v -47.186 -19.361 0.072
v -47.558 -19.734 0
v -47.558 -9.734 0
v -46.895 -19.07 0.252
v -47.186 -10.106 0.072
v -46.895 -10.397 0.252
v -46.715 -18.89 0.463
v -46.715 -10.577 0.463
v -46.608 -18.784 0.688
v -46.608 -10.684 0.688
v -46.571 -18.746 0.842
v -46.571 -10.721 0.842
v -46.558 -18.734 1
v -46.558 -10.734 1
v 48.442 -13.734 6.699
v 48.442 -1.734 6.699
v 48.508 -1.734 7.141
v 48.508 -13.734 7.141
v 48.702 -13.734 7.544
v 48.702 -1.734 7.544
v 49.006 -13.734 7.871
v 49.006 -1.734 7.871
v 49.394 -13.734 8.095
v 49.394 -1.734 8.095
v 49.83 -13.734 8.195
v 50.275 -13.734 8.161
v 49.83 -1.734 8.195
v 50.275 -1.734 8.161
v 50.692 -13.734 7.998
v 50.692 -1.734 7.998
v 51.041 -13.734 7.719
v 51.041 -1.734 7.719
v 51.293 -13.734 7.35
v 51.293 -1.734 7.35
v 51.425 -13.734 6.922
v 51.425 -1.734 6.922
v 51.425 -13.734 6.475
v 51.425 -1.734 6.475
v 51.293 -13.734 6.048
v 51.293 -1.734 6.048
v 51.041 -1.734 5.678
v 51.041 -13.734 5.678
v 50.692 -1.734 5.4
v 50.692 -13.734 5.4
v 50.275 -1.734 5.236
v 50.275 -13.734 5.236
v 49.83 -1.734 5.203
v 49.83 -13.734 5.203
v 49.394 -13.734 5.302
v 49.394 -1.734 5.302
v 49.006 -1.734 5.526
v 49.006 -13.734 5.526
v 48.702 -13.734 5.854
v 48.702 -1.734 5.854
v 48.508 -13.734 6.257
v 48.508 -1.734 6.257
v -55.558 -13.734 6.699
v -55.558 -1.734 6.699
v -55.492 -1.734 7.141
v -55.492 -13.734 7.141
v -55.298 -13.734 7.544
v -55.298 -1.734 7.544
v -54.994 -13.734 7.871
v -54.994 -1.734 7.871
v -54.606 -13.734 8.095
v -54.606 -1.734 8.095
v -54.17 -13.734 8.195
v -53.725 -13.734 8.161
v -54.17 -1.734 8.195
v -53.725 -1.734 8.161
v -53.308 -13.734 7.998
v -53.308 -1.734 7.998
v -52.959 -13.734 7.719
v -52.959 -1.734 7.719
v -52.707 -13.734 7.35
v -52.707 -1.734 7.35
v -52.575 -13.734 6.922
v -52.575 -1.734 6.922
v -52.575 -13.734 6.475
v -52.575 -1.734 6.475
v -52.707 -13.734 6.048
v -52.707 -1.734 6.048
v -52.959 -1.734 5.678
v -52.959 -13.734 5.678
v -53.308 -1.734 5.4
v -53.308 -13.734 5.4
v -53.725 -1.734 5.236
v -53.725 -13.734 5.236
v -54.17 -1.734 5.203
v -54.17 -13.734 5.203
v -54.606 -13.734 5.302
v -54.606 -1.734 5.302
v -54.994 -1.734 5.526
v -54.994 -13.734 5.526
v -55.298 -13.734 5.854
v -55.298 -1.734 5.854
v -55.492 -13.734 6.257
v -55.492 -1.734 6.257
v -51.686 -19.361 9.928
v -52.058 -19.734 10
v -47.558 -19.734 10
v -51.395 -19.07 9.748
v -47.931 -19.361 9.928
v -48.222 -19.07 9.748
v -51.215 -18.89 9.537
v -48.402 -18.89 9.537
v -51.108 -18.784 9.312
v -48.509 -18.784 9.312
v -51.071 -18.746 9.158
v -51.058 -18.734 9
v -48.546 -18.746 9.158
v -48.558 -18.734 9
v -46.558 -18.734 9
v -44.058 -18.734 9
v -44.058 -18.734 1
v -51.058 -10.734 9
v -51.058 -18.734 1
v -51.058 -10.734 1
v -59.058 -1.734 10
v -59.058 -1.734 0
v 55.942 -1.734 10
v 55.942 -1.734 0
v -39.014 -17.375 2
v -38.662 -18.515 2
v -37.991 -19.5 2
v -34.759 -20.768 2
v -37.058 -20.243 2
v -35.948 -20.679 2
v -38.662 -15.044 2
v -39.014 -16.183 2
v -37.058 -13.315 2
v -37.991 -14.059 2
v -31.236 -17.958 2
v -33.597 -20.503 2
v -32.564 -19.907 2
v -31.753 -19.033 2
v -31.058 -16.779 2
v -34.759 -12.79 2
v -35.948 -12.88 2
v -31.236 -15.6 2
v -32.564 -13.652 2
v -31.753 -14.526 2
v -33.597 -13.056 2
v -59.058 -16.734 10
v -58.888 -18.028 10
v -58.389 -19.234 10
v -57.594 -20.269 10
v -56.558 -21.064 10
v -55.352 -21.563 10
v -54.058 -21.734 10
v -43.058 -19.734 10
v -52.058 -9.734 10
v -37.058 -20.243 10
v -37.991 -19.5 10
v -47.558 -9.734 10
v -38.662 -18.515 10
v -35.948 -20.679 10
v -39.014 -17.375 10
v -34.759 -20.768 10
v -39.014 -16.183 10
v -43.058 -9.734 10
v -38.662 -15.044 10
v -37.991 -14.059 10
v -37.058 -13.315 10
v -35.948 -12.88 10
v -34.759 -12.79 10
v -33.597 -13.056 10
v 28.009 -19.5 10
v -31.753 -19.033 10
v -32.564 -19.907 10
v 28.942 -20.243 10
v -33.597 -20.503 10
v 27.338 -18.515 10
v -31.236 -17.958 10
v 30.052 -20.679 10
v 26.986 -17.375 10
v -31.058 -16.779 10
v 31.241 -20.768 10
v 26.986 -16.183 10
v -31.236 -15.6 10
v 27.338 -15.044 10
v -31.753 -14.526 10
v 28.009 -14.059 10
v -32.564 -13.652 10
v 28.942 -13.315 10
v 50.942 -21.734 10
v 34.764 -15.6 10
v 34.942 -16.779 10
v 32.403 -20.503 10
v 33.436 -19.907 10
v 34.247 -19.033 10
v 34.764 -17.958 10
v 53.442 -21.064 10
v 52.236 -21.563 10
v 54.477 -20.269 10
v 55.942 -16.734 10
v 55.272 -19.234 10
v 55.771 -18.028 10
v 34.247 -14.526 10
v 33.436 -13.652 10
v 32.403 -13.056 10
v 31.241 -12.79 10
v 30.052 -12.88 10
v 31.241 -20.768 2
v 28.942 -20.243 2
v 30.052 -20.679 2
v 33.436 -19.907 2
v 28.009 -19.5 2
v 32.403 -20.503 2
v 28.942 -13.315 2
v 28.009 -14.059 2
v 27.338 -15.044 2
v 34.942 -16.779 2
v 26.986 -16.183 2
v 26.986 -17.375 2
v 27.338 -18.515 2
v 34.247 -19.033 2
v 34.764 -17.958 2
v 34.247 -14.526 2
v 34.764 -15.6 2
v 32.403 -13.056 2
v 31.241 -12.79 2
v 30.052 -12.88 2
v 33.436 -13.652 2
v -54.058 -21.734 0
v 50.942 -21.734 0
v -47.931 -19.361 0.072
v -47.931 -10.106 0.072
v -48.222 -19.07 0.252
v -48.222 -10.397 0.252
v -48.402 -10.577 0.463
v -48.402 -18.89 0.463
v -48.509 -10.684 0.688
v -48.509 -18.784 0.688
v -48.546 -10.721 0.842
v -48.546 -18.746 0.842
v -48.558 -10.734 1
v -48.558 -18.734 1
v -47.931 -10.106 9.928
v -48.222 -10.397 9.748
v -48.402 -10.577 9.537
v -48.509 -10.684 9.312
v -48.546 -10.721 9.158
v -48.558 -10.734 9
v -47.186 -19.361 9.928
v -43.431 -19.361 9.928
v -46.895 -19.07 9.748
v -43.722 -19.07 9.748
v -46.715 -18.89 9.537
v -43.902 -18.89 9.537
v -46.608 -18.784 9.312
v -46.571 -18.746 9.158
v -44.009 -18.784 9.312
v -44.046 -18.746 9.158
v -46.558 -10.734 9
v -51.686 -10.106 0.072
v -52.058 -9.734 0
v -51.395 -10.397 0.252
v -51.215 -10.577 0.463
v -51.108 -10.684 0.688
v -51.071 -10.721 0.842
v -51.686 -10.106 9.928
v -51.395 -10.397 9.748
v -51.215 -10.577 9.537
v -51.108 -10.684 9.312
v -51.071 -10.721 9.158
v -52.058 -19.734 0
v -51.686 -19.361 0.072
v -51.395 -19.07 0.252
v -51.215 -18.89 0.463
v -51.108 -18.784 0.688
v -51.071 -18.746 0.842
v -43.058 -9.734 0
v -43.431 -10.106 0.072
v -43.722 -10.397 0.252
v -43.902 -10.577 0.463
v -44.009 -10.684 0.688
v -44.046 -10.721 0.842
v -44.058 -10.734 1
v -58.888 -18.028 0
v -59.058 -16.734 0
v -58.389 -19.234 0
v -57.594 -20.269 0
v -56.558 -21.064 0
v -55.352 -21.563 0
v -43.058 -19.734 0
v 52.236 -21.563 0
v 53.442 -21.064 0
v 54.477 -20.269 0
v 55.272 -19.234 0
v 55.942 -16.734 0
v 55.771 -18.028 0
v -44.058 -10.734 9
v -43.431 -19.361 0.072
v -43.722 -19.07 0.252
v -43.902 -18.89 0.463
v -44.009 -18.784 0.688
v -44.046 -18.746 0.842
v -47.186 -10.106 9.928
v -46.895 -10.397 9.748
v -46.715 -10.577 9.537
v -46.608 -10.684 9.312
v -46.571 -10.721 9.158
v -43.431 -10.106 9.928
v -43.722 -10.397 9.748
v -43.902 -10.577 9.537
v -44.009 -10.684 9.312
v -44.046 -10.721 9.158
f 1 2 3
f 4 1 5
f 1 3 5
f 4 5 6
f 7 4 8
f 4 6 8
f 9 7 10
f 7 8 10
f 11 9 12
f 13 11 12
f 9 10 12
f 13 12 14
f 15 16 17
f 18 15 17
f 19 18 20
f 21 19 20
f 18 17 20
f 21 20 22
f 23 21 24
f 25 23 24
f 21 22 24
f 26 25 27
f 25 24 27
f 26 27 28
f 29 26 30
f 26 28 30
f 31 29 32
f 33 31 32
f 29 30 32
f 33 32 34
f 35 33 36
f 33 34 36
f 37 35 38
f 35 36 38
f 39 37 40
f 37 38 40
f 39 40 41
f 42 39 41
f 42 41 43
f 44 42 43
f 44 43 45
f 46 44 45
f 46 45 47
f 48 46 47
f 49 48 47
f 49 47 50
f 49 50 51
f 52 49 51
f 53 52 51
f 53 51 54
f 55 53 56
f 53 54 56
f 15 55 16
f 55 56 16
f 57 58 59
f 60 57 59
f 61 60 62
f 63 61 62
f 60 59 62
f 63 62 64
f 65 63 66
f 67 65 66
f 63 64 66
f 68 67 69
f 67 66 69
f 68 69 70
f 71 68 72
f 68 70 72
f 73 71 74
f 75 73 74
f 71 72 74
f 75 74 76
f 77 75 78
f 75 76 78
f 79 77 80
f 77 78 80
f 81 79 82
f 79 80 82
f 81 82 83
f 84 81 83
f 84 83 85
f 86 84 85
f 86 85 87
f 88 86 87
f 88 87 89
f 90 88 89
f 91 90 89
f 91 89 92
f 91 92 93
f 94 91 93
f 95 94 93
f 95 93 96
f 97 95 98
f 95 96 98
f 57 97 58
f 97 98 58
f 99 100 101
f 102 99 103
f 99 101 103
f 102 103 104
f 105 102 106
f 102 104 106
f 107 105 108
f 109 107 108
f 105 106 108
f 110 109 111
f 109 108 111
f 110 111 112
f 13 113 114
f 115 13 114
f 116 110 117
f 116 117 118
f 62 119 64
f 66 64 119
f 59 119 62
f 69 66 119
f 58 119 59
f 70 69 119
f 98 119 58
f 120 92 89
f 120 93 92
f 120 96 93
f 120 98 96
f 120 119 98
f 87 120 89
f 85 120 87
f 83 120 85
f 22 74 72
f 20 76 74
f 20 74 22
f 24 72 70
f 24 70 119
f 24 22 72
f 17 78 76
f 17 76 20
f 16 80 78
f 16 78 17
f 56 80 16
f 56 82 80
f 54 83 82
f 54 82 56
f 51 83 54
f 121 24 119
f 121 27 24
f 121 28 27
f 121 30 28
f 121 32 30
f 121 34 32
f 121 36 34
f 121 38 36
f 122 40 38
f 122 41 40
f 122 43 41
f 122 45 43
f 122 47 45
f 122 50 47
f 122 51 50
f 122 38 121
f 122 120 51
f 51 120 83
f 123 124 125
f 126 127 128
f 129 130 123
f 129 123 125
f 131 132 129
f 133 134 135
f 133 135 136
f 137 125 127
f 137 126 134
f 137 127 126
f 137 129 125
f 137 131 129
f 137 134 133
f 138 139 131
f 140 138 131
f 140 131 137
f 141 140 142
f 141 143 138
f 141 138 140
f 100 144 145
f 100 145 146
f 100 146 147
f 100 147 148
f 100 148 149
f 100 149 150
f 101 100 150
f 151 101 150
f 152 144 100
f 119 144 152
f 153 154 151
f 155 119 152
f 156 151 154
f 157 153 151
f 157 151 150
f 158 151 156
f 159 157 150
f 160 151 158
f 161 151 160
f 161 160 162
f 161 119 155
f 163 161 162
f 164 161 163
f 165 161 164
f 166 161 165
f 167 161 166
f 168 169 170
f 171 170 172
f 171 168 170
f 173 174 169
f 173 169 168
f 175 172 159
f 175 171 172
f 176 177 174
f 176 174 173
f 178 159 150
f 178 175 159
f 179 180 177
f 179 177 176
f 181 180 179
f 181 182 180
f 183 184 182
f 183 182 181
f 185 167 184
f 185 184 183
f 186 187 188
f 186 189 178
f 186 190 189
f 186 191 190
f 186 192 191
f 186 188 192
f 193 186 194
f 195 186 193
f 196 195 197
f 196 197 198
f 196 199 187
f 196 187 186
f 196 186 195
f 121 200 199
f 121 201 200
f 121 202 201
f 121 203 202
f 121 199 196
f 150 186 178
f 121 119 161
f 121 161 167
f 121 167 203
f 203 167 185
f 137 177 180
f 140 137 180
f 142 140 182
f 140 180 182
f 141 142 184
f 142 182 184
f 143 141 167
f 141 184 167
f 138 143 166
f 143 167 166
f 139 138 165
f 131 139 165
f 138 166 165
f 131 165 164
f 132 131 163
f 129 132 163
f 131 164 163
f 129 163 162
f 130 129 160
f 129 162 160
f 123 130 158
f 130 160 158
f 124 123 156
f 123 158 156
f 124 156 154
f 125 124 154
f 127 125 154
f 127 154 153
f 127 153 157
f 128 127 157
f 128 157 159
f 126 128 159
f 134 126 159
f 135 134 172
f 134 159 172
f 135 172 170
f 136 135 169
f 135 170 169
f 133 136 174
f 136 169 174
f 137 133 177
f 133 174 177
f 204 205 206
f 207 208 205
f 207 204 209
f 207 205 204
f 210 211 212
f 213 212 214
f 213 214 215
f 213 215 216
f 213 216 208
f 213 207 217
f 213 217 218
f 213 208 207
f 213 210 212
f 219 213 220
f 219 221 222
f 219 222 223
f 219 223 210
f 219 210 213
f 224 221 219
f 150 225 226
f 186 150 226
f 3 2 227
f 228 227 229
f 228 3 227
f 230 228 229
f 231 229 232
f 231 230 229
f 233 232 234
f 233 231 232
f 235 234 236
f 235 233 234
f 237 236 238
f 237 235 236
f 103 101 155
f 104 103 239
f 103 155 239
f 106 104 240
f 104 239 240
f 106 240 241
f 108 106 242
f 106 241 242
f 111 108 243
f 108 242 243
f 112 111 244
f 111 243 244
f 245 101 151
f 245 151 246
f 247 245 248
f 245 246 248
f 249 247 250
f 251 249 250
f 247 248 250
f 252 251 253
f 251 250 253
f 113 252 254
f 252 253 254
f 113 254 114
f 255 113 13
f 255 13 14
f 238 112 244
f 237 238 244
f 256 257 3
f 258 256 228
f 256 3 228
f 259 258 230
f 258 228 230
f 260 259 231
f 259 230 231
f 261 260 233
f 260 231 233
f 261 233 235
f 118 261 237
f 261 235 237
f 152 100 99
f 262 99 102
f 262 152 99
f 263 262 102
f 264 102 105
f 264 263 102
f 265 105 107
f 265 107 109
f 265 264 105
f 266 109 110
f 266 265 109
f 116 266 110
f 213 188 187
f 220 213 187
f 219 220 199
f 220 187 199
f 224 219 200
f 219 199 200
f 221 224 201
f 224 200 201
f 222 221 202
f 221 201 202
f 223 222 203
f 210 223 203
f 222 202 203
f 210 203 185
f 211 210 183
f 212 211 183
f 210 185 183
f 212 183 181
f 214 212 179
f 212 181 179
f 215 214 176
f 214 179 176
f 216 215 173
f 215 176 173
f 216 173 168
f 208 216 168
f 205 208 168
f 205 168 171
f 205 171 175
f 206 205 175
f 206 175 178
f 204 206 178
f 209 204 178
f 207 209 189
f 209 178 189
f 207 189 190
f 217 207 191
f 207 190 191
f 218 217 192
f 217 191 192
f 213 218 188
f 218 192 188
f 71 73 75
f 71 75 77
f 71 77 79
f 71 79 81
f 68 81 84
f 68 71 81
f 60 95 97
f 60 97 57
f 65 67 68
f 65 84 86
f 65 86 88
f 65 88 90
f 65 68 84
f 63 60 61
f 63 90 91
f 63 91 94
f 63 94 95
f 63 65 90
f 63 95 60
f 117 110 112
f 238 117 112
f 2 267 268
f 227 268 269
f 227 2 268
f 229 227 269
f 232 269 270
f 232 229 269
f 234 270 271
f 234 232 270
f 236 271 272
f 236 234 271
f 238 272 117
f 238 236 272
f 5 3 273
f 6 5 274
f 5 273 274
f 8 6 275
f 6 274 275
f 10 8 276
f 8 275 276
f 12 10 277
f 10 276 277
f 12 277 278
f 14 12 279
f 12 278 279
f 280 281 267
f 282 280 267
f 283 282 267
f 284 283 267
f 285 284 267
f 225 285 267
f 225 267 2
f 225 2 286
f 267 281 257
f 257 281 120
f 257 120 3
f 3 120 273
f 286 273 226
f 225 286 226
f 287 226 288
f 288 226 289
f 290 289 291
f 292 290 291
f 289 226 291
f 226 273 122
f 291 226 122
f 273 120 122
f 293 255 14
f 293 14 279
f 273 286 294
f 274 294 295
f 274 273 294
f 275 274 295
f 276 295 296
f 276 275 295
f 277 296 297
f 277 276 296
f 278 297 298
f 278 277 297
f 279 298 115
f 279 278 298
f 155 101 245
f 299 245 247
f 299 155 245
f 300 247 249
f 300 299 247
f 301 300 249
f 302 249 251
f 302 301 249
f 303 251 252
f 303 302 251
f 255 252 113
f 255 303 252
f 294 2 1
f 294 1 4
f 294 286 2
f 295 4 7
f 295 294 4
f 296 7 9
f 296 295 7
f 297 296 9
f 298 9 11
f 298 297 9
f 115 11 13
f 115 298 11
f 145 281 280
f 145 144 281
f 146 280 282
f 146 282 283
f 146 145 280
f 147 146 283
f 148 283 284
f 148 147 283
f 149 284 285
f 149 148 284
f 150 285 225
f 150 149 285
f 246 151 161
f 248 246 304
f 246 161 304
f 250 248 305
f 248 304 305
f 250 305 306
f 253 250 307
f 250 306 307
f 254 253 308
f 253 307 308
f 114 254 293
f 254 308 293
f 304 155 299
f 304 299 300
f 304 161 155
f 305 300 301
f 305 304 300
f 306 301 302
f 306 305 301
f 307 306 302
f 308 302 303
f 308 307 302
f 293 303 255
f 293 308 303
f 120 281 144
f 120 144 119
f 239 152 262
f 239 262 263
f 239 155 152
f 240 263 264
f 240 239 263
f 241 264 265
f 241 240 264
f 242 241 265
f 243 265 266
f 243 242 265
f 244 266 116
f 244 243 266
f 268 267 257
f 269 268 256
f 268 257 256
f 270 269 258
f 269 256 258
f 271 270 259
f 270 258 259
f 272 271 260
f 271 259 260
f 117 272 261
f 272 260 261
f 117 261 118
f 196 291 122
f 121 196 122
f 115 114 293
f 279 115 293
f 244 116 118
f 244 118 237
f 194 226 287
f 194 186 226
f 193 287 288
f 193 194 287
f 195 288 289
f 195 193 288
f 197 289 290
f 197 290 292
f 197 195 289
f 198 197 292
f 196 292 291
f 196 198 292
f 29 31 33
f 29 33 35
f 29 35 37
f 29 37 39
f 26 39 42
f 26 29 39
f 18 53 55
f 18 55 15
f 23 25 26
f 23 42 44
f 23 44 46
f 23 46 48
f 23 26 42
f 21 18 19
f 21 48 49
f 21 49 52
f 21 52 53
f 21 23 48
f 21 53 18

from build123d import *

# Parameters (mm, degrees)
F0_W     = 115
F0_H     = 20
F1_DEPTH = 10
F2_R     = 4
F3_DEPTH = 8
F4_R     = 1.5
F5_DEPTH = 12
F6_R     = 5
F7_W     = 2.5
F7_H     = 8
F8_DEPTH = 25
F9_R     = 0.99999


# Not quite as in the source:
# - a fillet or chamfer is up to 0.001 mm smaller than in the source, because OpenCascade refuses the exact size


with BuildPart() as f1:
    # F0 (on Top) → F1 (new body)
    with BuildSketch(Plane.XY):
        with Locations((-1.558380723, -11.7337754572)):
            Rectangle(F0_W, F0_H)
    extrude(amount=F1_DEPTH)

    # F2 (on face) → F3 (cut)
    with BuildSketch(Plane.XY.offset(10)):
        with Locations((-35.058380723, -16.7792532593)):
            Circle(F2_R)
        with Locations((30.941619277, -16.7792532593)):
            Circle(F2_R)
    extrude(amount=-F3_DEPTH, mode=Mode.SUBTRACT)

    # F4 (on face) → F5 (cut)
    with BuildSketch(Plane(origin=(0, -1.7337754572, 0), x_dir=(-1, 0, 0), z_dir=(0, 1, 0))):
        with Locations((54.058380723, 6.6987262902)):
            Circle(F4_R)
        with Locations((-49.941619277, 6.6987262902)):
            Circle(F4_R)
    extrude(amount=-F5_DEPTH, mode=Mode.SUBTRACT)

    # F6
    f6_edges = [f1.edges().sort_by_distance(p)[0] for p in [
        (-59.058381, -21.733775, 5),
        (55.941619, -21.733775, 5),
    ]]
    fillet(f6_edges, radius=F6_R)

    # F7 (on face) → F8 (cut)
    with BuildSketch(Plane.XY.offset(10)):
        with Locations((-49.808380723, -14.7337754572)):
            Rectangle(F7_W, F7_H)
        with Locations((-45.308380723, -14.7337754572)):
            Rectangle(F7_W, F7_H)
    extrude(amount=-F8_DEPTH, mode=Mode.SUBTRACT)

    # F9 (radius 1 in the source; OpenCascade refuses exactly that, so slightly less here)
    f9_edges = [f1.edges().sort_by_distance(p)[0] for p in [
        (-51.058381, -14.733775, 10),
        (-49.808381, -10.733775, 10),
        (-48.558381, -14.733775, 10),
        (-49.808381, -18.733775, 10),
        (-45.308381, -18.733775, 10),
        (-46.558381, -14.733775, 10),
        (-45.308381, -10.733775, 10),
        (-44.058381, -14.733775, 10),
        (-44.058381, -14.733775, 0),
        (-45.308381, -10.733775, 0),
        (-46.558381, -14.733775, 0),
        (-45.308381, -18.733775, 0),
        (-49.808381, -18.733775, 0),
        (-48.558381, -14.733775, 0),
        (-49.808381, -10.733775, 0),
        (-51.058381, -14.733775, 0),
    ]]
    fillet(f9_edges, radius=F9_R)


solid = f1.part
